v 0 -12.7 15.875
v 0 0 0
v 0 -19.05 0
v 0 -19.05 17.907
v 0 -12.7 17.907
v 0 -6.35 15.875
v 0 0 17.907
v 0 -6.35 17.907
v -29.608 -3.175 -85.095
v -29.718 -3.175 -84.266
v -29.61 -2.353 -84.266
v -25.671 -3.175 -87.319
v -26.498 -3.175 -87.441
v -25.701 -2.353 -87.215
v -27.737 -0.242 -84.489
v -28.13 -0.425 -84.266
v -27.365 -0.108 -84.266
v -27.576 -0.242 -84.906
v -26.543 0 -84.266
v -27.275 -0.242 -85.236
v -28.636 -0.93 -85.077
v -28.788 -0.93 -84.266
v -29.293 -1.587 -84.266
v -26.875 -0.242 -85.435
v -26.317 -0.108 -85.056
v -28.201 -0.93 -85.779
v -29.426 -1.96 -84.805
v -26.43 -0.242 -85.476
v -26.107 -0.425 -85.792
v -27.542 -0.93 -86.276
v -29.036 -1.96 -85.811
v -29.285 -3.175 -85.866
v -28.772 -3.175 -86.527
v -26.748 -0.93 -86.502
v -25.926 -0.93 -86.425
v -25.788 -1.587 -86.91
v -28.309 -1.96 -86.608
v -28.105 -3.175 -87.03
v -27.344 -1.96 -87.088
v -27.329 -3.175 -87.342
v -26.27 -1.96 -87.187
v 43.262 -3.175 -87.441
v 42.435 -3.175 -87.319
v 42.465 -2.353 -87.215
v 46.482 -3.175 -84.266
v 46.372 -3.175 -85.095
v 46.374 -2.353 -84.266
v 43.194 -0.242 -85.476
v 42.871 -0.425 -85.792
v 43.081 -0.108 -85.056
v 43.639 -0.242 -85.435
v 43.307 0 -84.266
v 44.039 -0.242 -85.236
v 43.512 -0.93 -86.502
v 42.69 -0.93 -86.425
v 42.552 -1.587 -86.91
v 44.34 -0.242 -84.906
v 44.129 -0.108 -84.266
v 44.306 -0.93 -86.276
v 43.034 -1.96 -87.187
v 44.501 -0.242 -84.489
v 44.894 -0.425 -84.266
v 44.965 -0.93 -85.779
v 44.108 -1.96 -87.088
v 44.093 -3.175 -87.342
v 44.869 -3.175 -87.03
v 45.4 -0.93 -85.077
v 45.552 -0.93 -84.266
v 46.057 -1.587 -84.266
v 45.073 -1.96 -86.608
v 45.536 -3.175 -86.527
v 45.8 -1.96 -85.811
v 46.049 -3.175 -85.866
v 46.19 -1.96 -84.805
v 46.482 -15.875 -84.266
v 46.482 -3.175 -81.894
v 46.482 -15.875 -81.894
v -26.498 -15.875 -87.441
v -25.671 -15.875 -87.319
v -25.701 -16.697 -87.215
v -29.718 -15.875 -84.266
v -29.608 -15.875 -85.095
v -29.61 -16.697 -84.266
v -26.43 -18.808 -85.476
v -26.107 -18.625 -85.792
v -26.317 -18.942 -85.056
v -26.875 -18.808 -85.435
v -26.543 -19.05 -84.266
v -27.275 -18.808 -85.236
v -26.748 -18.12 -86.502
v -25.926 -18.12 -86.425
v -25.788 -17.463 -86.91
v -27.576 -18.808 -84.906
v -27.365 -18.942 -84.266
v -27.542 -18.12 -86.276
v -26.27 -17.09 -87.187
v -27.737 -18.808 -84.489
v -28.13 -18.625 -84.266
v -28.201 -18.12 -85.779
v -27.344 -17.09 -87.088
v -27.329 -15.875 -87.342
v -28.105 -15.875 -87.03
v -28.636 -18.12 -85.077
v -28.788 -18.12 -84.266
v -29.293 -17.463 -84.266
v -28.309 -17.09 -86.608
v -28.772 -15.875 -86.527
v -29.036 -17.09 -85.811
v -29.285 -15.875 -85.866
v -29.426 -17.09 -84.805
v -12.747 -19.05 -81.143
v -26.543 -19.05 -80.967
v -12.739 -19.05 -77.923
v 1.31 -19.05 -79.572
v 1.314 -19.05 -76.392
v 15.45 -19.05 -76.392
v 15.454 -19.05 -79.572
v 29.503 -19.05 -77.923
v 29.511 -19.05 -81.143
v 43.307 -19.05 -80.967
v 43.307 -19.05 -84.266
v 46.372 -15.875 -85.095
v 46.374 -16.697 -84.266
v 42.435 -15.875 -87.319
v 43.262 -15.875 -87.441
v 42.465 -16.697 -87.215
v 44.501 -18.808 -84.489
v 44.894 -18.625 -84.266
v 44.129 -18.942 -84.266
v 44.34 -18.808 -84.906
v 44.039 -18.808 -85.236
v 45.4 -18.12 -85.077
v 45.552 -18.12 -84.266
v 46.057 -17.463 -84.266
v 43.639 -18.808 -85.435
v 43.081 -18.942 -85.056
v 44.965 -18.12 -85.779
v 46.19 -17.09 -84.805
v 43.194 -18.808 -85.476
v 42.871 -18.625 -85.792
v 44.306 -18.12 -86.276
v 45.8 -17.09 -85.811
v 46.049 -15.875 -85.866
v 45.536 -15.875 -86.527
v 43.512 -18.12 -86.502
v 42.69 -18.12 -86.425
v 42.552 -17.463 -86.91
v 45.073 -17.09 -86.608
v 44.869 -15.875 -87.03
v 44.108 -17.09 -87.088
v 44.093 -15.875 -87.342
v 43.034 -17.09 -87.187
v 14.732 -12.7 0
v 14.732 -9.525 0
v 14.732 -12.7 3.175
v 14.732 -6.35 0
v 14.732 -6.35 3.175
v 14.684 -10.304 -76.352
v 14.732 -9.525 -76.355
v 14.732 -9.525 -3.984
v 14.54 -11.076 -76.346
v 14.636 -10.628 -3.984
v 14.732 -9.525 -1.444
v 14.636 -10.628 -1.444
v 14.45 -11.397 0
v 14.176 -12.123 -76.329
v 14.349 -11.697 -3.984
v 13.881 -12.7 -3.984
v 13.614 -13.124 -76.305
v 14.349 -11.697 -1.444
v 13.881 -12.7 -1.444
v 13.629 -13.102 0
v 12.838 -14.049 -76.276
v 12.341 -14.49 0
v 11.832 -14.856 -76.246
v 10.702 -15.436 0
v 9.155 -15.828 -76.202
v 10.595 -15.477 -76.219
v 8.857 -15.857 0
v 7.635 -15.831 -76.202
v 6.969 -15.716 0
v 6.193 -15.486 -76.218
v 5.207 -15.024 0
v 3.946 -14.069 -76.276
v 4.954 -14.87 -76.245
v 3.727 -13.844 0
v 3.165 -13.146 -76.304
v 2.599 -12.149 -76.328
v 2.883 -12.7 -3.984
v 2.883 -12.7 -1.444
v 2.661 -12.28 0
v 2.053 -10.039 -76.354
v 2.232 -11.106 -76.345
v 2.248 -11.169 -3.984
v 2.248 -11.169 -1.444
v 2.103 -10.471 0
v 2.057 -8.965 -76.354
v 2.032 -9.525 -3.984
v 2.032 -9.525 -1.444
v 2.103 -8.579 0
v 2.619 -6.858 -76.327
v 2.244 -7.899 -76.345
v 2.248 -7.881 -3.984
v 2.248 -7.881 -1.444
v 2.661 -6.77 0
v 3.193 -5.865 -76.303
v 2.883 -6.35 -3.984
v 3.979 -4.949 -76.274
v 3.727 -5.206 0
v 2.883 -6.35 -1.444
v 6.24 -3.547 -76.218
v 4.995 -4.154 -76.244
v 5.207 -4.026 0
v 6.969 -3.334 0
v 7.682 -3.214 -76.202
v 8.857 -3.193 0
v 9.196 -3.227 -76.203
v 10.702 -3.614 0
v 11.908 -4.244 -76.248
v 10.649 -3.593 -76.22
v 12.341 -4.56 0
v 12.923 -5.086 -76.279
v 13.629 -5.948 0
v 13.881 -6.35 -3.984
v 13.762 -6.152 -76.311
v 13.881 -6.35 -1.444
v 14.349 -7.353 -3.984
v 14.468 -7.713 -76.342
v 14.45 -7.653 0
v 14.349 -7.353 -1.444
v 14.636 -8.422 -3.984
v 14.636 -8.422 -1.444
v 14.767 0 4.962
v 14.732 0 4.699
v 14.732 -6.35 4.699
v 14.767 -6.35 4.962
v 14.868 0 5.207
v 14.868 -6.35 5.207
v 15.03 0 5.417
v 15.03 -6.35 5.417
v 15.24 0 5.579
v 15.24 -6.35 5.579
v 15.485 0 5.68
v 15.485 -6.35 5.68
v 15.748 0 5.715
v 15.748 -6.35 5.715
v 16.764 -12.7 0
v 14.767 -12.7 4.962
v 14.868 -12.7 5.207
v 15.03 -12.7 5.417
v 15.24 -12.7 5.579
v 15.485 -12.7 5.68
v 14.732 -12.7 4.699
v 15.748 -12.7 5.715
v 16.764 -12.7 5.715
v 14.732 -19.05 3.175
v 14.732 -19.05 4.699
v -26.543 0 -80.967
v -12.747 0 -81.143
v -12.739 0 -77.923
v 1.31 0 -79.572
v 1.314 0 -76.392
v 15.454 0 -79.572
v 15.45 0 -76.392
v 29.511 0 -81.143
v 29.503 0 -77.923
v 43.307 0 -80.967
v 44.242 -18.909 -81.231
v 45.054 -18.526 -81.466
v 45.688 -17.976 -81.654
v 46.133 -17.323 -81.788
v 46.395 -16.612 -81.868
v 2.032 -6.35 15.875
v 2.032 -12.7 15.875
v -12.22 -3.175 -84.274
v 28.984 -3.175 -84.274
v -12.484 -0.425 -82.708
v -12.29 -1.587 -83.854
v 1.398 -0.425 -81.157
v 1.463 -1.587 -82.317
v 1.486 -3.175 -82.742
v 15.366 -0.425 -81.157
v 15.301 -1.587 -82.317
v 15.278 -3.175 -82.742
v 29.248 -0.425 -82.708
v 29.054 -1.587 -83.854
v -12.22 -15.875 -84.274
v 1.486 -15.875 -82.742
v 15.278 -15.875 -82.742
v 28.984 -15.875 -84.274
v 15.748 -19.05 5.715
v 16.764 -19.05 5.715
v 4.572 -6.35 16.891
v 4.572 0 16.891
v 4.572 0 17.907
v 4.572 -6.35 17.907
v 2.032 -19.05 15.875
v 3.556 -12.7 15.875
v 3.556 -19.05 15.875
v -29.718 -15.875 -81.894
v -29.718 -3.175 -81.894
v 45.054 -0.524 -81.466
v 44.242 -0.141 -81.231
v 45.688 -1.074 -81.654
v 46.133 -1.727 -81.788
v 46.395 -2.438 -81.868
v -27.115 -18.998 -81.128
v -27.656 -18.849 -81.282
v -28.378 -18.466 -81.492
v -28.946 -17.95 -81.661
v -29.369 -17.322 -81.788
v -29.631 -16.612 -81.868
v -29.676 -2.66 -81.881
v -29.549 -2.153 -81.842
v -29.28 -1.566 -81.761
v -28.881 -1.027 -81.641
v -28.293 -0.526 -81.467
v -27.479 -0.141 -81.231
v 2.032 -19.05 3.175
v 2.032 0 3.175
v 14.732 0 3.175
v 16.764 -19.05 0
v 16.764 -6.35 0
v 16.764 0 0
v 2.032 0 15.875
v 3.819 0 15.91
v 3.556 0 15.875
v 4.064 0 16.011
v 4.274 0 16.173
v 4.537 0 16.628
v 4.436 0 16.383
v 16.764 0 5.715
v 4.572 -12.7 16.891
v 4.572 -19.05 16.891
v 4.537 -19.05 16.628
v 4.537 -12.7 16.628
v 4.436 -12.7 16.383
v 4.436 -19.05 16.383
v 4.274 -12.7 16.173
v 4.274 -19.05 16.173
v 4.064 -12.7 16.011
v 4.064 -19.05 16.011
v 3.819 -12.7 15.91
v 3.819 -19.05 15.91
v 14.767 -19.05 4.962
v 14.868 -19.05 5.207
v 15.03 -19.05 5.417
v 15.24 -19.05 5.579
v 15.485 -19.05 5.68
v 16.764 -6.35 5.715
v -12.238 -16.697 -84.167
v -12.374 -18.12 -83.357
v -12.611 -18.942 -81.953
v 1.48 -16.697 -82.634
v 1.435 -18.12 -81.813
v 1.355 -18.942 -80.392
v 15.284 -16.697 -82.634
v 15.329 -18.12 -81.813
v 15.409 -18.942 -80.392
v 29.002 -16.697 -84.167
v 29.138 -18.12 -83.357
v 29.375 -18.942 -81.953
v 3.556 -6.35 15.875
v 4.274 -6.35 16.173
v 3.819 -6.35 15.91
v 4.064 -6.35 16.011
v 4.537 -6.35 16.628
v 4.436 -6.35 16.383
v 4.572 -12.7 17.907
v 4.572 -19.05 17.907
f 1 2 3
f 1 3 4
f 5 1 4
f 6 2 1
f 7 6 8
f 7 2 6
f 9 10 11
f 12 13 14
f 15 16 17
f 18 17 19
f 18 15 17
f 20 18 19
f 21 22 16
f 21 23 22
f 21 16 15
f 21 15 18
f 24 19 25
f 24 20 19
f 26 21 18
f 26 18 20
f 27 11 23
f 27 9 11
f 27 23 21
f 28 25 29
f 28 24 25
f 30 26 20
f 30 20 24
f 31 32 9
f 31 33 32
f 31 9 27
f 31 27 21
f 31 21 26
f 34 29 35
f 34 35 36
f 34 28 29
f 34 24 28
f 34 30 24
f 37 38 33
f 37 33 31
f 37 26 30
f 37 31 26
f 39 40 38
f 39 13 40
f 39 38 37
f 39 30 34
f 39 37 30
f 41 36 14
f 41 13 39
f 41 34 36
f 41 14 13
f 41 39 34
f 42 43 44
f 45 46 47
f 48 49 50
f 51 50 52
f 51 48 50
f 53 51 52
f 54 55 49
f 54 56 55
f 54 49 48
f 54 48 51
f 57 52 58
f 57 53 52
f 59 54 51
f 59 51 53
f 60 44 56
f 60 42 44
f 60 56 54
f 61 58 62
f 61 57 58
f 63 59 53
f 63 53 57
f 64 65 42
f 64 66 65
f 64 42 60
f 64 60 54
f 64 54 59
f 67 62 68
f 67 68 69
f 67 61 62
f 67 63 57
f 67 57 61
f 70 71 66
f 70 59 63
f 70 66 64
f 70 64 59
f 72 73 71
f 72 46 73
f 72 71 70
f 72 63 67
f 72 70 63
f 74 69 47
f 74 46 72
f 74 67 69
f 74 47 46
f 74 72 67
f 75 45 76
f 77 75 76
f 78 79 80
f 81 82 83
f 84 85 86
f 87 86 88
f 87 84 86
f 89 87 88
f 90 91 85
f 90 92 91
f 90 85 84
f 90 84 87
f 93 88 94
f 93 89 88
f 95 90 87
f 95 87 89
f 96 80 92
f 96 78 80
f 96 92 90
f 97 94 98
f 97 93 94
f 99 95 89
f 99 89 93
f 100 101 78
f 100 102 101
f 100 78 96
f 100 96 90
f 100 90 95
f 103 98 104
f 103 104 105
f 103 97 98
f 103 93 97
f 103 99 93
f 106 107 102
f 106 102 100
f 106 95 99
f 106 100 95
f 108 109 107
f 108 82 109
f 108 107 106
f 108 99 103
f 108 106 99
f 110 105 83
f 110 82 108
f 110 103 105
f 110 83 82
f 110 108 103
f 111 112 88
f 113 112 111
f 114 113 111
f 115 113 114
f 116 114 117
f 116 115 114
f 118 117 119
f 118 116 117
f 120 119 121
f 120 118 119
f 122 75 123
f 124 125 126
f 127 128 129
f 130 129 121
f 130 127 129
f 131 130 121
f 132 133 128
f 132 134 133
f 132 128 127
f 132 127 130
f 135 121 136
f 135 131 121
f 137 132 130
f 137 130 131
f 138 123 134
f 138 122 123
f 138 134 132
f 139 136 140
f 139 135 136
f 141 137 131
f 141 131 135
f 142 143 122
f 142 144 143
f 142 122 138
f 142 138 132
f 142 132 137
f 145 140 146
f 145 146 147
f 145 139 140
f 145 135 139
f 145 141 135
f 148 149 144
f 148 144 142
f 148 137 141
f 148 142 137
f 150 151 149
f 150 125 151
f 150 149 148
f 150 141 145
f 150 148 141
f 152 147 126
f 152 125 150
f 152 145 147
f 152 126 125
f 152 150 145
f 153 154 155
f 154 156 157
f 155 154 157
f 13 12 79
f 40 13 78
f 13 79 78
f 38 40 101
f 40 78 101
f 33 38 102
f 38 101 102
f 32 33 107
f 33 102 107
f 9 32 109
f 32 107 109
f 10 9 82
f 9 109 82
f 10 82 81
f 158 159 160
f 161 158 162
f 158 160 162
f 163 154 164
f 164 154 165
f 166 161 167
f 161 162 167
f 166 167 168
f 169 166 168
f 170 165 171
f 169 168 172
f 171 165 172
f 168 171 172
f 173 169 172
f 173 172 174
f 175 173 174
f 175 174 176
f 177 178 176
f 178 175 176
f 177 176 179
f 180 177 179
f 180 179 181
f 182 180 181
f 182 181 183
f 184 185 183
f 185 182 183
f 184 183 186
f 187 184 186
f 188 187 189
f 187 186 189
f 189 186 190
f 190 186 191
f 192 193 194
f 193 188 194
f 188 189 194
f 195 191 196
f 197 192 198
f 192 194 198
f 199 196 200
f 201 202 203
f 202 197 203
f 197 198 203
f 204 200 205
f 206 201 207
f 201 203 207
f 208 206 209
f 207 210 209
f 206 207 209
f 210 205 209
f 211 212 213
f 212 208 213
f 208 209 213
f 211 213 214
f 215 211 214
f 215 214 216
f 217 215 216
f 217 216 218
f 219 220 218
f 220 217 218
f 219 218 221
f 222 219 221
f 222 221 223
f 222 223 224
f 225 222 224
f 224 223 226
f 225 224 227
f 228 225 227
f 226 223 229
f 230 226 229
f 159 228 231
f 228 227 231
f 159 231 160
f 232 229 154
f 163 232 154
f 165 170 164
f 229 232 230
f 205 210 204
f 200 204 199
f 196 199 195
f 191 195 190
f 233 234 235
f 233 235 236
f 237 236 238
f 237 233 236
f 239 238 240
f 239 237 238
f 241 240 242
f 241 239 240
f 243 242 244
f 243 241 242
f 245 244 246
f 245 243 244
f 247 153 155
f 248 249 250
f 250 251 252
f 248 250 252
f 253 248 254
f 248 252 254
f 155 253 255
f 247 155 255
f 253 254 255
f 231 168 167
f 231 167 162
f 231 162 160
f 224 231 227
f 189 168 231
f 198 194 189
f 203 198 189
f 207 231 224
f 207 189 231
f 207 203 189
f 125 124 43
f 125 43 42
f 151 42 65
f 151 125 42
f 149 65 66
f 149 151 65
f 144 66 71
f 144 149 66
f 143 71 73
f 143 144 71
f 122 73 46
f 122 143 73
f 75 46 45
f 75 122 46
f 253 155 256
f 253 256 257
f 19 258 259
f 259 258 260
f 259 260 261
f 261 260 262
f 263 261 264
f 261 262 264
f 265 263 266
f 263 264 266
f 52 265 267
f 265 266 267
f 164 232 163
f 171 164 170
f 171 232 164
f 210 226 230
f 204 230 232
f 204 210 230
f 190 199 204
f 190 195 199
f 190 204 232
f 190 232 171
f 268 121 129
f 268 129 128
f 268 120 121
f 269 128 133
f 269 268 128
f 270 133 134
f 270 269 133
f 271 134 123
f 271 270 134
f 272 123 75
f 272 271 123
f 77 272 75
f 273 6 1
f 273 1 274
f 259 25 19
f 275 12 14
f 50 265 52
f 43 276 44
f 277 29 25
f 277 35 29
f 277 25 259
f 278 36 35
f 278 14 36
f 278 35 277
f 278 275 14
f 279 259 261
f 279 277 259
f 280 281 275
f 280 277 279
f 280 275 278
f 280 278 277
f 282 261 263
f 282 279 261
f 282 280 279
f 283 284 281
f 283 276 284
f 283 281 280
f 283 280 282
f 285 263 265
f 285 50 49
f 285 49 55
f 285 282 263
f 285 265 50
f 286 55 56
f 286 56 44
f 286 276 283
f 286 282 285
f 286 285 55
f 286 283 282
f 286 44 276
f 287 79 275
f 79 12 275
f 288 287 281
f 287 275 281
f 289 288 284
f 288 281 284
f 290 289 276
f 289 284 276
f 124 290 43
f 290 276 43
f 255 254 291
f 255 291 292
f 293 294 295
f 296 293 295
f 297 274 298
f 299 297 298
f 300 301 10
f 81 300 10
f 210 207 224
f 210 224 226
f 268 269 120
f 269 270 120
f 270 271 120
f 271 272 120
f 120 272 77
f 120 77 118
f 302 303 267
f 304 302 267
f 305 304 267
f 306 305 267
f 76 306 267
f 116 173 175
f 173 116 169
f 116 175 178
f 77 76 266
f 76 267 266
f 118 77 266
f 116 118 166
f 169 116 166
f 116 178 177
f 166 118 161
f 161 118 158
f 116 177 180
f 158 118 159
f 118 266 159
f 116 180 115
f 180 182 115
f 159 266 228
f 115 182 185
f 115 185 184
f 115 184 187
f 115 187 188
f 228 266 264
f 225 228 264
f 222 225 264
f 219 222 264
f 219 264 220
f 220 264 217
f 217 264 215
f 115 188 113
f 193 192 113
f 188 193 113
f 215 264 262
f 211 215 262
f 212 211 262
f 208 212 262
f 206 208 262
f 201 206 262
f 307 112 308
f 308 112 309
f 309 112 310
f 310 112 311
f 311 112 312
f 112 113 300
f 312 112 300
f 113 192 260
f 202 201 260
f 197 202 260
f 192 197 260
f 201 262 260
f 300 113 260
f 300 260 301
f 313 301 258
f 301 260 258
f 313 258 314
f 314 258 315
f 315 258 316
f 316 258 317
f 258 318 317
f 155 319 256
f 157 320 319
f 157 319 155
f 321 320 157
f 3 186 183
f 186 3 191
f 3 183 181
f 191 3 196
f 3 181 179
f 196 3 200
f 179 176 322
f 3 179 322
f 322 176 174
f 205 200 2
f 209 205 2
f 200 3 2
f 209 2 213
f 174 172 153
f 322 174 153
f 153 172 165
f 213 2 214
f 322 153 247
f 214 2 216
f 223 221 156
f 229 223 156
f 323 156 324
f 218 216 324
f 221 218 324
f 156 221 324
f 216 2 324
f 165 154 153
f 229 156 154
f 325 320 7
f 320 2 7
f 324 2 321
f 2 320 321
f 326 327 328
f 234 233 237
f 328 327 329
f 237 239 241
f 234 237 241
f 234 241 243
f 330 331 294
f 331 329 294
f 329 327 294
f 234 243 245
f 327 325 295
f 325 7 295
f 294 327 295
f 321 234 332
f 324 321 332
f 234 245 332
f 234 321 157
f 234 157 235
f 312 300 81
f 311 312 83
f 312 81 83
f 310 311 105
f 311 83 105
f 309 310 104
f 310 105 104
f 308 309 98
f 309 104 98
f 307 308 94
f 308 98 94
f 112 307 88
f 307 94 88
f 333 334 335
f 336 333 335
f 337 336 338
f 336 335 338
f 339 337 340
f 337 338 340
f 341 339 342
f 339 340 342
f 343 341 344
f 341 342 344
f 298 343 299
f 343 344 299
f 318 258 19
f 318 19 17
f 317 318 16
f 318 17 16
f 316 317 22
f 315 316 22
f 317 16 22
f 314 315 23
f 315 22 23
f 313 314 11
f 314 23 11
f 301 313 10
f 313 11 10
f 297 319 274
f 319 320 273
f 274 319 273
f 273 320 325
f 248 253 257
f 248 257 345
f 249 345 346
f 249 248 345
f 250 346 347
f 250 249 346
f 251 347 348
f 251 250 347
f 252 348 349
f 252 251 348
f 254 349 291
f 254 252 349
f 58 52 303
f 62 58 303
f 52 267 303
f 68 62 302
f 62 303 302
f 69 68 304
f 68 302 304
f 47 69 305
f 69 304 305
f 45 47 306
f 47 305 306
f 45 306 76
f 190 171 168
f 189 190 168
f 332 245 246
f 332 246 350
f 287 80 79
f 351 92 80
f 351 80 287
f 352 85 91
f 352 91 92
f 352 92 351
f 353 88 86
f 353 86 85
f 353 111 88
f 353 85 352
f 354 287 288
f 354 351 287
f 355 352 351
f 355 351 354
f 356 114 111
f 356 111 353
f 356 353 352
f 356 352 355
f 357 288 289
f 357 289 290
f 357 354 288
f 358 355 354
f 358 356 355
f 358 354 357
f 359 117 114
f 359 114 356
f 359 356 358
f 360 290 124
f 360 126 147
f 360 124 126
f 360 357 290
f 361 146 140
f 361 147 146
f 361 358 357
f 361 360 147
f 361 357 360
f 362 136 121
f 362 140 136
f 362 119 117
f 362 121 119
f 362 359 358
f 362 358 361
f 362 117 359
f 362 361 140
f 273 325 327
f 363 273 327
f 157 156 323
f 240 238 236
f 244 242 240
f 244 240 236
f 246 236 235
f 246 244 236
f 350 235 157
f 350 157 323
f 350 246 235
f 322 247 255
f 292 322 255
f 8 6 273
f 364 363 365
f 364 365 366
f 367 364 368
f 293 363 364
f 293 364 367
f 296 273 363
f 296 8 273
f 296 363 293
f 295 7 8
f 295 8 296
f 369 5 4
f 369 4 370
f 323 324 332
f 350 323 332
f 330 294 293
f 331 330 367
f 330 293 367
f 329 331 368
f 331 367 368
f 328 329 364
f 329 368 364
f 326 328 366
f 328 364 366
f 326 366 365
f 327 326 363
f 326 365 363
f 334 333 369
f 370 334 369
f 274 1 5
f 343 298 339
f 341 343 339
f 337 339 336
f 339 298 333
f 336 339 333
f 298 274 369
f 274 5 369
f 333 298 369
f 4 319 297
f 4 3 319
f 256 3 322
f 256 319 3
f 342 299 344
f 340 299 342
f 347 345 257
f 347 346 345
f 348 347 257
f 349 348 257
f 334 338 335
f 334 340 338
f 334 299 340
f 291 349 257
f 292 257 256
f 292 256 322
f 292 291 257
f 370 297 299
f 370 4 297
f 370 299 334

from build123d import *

# Parameters (mm, degrees)
F0_W      = 16.764
F0_H      = 17.907
F0_W_2    = 12.7
F0_H_2    = 12.7
F1_DEPTH  = 19.05
F2_W      = 21.1890064
F2_H      = 17.8200355506
F3_DEPTH  = 25.4
F4_R      = 6.35
F5_DEPTH  = 76.2
F7_DEPTH  = 19.05
F8_DEPTH  = 79.375
F9_R      = 3.175
F10_R     = 1.016
F12_DEPTH = 25.4
F13_W     = 9.1727420804
F13_H     = 4.4667599723
F13_W_2   = 3.1133545563
F13_H_2   = 8.6221548263
F14_DEPTH = 6.35


with BuildPart() as f1:
    # F0 (on Front) → F1 (new body)
    with BuildSketch(Plane.XZ):
        with Locations((8.382, 8.9535)):
            Rectangle(F0_W, F0_H)
        with Locations((8.382, 9.525)):
            Rectangle(F0_W_2, F0_H_2, mode=Mode.SUBTRACT)
    extrude(amount=F1_DEPTH)

    # F2 (on Front) → F3 (cut)
    with BuildSketch(Plane.XZ):
        with Locations((15.1665032, 14.6250177753)):
            Rectangle(F2_W, F2_H)
    extrude(amount=F3_DEPTH, mode=Mode.SUBTRACT)

    # F4 (on face) → F5 (join)
    with BuildSketch(Plane(origin=(0, 0, 0), x_dir=(1, 0, 0), z_dir=(0, 0, -1))):
        with Locations((8.382, 9.525)):
            Circle(F4_R)
    extrude(amount=F5_DEPTH)

    # F6 (on Front) → F7 (join)
    with BuildSketch(Plane.XZ):
        with BuildLine():
            Line((46.482, -88.5501227317), (46.482, -81.894013743))
            ThreePointArc((46.482, -81.894013743), (8.382, -76.2), (-29.718, -81.894013743))
            Line((-29.718, -81.894013743), (-29.718, -88.5501227317))
            ThreePointArc((-29.718, -88.5501227317), (8.382, -82.55), (46.482, -88.5501227317))
        make_face()
    extrude(amount=F7_DEPTH)

    # F4 (on face) → F8 (join)
    with BuildSketch(Plane(origin=(0, 0, 0), x_dir=(1, 0, 0), z_dir=(0, 0, -1))):
        with Locations((8.382, 9.525)):
            Circle(F4_R)
    extrude(amount=F8_DEPTH)

    # F9
    f9_edges = [f1.edges().sort_by_distance(p)[0] for p in [
        (8.382, -19.05, -82.55),
        (46.482, -9.525, -88.550123),
        (46.482, -19.05, -85.222068),
        (-29.718, -19.05, -85.222068),
        (-29.718, 0, -85.222068),
        (8.382, 0, -82.55),
        (-29.718, -9.525, -88.550123),
        (46.482, 0, -85.222068),
    ]]
    fillet(f9_edges, radius=F9_R)

    # F10
    f10_edges = [f1.edges().sort_by_distance(p)[0] for p in [
        (4.572, -9.525, 15.875),
        (14.732, -9.525, 5.715),
    ]]
    fillet(f10_edges, radius=F10_R)

    # F11 (on Right) → F12 (cut)
    with BuildSketch(Plane.YZ):
        Polygon((-9.525, -1.4437012938), (-12.7, -1.4437012938), (-12.7, -3.9837012938), (-6.35, -3.9837012938), (-6.35, -1.4437012938), align=None)
    extrude(amount=F12_DEPTH, mode=Mode.SUBTRACT)

    # F13 (on face) → F14 (cut, through all)
    with BuildSketch(Plane.XZ.offset(6.35)):
        with Locations((3.6581899913, 18.1083799861)):
            Rectangle(F13_W, F13_H)
        with Locations((16.2886772781, 2.7195581933)):
            Rectangle(F13_W_2, F13_H_2)
    extrude(amount=F14_DEPTH, mode=Mode.SUBTRACT)


solid = f1.part
